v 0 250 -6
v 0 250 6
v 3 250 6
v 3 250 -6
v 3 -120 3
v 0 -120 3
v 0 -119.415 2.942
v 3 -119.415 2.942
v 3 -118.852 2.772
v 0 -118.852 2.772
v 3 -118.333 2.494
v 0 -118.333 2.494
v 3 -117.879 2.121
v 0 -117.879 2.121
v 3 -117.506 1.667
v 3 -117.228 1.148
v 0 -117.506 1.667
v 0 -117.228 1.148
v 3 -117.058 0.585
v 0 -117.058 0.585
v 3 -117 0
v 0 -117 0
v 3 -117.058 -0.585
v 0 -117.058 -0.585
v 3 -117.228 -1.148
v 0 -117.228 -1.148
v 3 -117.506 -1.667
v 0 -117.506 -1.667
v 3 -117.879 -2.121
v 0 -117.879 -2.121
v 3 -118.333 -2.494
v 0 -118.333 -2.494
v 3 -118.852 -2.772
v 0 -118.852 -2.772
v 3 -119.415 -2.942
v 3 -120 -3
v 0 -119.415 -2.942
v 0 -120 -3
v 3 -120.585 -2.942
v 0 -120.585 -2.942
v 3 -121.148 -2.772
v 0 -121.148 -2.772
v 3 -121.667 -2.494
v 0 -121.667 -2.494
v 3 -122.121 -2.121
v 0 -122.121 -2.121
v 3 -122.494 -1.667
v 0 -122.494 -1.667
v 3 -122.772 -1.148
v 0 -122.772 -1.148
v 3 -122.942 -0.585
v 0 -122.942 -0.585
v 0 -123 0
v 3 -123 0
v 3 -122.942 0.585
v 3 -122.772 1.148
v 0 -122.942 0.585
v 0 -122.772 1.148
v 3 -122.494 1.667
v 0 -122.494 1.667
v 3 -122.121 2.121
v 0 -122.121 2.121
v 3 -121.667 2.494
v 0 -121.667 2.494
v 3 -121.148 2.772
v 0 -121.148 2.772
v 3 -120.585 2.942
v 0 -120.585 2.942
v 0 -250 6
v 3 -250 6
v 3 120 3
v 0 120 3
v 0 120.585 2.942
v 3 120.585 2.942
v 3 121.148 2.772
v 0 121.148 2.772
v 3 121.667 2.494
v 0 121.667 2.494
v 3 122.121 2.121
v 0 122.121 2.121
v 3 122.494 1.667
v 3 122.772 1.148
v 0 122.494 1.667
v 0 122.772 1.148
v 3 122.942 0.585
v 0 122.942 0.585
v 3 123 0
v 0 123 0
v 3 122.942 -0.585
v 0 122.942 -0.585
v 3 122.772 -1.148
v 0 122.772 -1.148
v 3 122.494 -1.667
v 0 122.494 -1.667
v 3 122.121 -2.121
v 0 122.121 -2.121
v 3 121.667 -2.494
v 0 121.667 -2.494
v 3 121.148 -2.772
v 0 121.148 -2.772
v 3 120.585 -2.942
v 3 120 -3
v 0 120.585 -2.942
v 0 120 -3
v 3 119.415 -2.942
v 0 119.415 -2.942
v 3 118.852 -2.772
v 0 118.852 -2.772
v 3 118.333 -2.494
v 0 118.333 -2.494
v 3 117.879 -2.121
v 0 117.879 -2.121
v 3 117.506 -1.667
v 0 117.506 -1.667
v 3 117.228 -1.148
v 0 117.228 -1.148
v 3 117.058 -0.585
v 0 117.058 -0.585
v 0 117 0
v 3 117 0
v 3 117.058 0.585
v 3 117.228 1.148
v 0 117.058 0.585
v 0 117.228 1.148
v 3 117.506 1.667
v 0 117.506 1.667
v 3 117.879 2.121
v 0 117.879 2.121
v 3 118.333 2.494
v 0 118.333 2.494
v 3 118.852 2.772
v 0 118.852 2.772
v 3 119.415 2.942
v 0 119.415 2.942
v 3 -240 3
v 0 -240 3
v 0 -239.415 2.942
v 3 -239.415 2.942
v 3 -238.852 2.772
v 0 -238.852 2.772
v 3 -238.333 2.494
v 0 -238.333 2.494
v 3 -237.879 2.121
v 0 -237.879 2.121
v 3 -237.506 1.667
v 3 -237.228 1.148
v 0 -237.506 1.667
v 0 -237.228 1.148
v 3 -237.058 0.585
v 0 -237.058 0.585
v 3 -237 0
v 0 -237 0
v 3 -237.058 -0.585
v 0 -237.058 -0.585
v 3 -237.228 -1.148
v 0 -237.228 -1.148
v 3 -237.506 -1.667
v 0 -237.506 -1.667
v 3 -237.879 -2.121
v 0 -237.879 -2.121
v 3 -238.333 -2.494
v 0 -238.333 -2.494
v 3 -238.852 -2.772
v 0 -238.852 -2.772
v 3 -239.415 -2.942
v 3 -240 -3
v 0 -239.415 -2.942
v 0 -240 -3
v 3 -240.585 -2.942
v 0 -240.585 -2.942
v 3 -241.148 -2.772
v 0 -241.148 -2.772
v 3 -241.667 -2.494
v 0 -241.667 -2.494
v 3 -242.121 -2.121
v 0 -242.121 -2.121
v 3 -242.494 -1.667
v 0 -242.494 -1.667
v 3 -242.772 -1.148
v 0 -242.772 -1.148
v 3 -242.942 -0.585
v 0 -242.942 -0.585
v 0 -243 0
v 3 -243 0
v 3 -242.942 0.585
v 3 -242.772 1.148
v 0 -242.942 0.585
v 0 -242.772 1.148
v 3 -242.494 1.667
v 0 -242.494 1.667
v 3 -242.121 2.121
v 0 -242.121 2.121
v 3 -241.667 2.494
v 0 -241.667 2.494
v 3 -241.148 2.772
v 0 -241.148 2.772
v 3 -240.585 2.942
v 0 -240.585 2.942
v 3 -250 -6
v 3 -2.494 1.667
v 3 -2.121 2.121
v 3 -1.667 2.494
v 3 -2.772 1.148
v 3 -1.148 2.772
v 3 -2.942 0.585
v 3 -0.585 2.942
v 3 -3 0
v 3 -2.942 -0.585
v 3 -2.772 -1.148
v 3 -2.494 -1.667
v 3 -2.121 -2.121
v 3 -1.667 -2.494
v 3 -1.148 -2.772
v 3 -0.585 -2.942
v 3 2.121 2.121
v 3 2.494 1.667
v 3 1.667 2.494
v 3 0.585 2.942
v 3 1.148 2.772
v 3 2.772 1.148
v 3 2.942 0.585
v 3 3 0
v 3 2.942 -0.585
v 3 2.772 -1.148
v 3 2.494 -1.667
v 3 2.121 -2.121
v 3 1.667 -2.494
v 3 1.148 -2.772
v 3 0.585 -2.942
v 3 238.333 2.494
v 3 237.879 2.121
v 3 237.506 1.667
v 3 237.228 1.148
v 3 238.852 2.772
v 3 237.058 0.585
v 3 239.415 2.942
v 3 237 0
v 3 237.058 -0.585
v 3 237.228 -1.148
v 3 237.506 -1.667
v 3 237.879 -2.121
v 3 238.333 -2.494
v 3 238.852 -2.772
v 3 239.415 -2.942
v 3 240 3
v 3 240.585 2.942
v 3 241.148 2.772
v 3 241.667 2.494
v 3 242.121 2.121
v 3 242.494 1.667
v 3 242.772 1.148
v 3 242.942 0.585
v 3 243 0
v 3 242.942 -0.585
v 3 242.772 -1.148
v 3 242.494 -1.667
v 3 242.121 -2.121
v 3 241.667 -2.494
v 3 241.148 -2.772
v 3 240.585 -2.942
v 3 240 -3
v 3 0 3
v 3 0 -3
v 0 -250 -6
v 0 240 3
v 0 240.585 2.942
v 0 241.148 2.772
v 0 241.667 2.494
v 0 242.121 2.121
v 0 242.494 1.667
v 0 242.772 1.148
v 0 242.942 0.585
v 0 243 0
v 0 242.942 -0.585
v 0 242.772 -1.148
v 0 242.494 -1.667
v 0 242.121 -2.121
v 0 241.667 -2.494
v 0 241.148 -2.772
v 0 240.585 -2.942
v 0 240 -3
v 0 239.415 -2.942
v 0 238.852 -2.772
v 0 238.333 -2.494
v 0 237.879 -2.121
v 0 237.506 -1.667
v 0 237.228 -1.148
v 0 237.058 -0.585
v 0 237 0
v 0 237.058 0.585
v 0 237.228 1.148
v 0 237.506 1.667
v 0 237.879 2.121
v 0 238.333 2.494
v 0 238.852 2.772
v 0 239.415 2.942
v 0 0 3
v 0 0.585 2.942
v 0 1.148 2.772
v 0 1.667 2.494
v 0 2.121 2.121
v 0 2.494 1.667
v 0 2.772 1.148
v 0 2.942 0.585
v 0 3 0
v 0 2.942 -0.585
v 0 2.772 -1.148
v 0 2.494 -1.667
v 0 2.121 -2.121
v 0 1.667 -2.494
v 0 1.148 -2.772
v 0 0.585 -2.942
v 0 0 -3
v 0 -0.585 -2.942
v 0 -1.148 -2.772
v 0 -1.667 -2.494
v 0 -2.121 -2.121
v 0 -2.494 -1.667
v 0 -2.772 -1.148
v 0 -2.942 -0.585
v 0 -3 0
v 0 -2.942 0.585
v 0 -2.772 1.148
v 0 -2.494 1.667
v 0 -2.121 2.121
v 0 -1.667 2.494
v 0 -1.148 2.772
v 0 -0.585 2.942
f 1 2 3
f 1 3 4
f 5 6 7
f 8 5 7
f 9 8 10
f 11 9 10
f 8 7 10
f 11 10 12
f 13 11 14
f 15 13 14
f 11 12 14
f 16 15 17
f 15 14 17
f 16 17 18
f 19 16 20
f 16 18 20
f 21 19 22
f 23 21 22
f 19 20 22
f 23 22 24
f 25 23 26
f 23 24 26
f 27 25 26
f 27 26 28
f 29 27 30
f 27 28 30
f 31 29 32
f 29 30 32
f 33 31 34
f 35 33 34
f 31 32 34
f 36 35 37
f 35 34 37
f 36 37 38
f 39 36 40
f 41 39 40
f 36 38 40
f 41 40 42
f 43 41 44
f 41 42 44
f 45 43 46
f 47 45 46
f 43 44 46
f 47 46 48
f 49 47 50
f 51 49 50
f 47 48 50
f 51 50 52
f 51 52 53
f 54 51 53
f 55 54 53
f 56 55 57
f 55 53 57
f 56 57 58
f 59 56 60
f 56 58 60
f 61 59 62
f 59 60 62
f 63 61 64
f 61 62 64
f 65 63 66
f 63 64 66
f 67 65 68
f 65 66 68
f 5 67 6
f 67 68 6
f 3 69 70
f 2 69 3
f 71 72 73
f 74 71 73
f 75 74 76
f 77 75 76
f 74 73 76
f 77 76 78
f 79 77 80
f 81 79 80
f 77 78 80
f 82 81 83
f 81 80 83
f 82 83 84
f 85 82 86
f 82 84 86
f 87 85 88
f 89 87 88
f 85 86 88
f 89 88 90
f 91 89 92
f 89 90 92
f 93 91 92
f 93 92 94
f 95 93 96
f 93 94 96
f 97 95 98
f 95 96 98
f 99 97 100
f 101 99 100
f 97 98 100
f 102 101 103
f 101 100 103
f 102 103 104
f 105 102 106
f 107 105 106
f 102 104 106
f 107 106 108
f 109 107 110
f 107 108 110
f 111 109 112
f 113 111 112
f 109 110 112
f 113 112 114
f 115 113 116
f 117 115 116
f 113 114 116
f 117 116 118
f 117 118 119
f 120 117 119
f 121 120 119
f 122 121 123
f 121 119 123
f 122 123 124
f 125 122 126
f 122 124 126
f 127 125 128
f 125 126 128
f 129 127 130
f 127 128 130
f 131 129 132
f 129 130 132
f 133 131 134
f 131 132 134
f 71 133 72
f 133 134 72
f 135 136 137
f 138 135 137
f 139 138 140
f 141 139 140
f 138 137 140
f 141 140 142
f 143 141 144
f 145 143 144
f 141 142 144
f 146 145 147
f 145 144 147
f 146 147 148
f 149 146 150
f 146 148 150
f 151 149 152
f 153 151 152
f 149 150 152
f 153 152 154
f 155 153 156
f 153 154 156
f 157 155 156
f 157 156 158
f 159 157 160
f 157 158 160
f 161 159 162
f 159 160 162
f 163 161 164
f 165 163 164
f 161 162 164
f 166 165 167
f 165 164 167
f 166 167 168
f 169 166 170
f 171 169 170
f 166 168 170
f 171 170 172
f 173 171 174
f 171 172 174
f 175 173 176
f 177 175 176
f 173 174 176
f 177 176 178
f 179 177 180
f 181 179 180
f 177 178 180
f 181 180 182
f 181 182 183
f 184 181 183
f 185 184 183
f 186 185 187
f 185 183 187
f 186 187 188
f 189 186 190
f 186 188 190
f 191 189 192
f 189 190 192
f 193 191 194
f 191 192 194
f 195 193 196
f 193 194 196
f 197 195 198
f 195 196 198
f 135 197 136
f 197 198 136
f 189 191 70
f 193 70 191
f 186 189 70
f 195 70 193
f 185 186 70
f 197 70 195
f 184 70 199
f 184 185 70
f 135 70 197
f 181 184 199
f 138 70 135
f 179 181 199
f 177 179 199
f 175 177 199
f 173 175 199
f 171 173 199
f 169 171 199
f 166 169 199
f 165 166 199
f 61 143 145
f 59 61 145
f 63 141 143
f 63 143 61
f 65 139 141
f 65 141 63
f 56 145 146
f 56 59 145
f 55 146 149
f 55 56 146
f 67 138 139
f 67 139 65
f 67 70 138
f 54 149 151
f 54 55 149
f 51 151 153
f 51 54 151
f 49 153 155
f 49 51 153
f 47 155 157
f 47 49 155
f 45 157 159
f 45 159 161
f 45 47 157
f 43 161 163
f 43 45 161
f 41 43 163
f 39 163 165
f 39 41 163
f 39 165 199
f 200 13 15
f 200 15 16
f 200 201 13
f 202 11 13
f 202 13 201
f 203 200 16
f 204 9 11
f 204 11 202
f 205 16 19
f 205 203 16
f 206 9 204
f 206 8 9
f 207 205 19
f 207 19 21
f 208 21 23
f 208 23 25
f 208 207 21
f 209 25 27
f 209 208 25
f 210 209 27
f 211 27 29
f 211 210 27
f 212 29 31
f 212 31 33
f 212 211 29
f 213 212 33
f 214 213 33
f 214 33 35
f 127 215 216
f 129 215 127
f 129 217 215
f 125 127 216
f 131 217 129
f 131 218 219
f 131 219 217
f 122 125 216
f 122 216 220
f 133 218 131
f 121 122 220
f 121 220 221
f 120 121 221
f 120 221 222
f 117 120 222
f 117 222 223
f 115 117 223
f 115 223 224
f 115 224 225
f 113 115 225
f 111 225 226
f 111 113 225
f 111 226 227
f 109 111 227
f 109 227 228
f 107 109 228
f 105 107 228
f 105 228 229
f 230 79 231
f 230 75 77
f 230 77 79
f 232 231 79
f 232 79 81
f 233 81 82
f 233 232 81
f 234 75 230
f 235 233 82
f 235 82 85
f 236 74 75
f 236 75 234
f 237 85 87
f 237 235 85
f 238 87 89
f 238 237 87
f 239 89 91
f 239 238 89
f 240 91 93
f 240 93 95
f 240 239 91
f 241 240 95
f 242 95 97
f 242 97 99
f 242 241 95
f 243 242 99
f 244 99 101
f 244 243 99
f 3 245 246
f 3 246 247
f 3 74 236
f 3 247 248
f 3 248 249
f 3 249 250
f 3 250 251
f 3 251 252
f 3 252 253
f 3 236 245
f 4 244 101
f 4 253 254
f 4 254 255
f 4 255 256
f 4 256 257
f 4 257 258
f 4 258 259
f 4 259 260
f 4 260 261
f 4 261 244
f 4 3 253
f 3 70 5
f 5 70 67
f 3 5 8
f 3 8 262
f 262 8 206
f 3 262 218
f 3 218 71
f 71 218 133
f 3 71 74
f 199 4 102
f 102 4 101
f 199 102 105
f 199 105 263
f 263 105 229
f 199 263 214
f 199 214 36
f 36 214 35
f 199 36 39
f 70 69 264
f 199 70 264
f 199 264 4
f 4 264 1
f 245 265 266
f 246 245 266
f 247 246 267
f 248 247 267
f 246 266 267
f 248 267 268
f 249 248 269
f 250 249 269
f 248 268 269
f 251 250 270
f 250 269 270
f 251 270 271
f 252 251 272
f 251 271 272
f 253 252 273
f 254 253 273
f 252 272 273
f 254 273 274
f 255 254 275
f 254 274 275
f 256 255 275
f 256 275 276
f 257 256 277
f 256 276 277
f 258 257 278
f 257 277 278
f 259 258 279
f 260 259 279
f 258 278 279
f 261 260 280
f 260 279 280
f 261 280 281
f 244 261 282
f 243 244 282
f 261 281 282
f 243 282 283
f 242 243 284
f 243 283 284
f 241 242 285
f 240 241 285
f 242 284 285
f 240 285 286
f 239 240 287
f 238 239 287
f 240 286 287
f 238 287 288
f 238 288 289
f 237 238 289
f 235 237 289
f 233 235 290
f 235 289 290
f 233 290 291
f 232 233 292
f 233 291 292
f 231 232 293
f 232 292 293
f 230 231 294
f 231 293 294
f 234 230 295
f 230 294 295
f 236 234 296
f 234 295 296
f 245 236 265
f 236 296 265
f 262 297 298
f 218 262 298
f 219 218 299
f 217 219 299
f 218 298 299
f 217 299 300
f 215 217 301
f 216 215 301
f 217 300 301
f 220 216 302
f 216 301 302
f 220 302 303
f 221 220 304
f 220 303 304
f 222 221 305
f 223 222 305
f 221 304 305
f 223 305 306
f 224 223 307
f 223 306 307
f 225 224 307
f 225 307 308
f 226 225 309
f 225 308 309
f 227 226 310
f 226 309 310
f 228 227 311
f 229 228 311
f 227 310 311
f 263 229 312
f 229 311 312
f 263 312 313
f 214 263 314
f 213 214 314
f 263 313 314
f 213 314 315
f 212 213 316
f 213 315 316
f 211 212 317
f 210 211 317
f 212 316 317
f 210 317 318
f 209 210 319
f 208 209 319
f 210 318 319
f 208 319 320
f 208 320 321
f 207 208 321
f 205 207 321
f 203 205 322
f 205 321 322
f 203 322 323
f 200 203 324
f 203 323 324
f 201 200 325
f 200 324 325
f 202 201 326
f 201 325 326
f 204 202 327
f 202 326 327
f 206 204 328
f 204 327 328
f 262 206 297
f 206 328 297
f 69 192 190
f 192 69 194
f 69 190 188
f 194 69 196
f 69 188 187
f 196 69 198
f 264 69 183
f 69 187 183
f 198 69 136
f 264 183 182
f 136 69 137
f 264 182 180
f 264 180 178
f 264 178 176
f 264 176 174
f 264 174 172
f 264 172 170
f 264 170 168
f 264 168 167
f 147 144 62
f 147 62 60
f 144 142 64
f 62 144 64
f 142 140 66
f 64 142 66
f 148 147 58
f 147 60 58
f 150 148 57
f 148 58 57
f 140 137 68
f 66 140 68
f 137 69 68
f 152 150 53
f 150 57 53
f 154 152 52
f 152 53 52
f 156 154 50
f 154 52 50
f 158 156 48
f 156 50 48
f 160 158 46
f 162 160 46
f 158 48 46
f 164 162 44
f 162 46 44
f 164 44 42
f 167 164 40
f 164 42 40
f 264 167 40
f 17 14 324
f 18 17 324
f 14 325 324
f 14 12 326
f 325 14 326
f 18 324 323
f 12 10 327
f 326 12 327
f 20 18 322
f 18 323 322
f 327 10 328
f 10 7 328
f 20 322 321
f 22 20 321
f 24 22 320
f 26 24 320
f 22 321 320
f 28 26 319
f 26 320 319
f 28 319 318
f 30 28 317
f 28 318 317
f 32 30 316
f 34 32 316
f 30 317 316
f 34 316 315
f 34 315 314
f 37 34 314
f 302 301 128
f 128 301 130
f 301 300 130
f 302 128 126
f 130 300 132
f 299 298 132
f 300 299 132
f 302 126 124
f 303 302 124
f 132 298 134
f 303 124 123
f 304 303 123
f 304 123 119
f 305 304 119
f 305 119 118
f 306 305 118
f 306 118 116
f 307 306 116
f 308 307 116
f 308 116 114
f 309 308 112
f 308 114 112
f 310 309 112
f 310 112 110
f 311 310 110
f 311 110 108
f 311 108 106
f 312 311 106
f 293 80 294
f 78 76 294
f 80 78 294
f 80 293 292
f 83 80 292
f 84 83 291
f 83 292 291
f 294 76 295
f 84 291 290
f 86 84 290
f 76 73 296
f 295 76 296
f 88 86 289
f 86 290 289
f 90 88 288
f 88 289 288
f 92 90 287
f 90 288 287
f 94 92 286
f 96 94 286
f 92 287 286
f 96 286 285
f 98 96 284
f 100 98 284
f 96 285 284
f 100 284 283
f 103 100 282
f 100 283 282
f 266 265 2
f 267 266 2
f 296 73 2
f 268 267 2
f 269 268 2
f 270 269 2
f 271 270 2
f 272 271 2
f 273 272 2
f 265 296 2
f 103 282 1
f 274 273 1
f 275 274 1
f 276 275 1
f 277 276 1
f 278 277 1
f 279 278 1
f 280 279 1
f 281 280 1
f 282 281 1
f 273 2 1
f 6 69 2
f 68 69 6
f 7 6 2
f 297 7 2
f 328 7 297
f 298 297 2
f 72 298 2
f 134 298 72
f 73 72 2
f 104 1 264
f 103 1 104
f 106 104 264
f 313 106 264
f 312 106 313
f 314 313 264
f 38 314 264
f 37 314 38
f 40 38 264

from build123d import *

# Parameters (mm, degrees)
SKETCH1_W           = 12
SKETCH1_H           = 500
BOSS_EXTRUDE1_DEPTH = 3
SKETCH3_R           = 3
CUT_EXTRUDE1_DEPTH  = 3


with BuildPart() as part:
    # Sketch1 → Boss-Extrude1 (new body)
    with BuildSketch(Plane(origin=(0, 0, 0), x_dir=(0, 0, -1), z_dir=(1, 0, 0))):
        Rectangle(SKETCH1_W, SKETCH1_H)
    extrude(amount=BOSS_EXTRUDE1_DEPTH)

    # Sketch3 → Cut-Extrude1 (cut)
    with BuildSketch(Plane.ZY):
        with Locations((0, 240)):
            Circle(SKETCH3_R)
        with Locations((0, 120)):
            Circle(SKETCH3_R)
        Circle(SKETCH3_R)
        with Locations((0, -120)):
            Circle(SKETCH3_R)
        with Locations((0, -240)):
            Circle(SKETCH3_R)
    extrude(amount=-CUT_EXTRUDE1_DEPTH, mode=Mode.SUBTRACT)


solid = part.part
